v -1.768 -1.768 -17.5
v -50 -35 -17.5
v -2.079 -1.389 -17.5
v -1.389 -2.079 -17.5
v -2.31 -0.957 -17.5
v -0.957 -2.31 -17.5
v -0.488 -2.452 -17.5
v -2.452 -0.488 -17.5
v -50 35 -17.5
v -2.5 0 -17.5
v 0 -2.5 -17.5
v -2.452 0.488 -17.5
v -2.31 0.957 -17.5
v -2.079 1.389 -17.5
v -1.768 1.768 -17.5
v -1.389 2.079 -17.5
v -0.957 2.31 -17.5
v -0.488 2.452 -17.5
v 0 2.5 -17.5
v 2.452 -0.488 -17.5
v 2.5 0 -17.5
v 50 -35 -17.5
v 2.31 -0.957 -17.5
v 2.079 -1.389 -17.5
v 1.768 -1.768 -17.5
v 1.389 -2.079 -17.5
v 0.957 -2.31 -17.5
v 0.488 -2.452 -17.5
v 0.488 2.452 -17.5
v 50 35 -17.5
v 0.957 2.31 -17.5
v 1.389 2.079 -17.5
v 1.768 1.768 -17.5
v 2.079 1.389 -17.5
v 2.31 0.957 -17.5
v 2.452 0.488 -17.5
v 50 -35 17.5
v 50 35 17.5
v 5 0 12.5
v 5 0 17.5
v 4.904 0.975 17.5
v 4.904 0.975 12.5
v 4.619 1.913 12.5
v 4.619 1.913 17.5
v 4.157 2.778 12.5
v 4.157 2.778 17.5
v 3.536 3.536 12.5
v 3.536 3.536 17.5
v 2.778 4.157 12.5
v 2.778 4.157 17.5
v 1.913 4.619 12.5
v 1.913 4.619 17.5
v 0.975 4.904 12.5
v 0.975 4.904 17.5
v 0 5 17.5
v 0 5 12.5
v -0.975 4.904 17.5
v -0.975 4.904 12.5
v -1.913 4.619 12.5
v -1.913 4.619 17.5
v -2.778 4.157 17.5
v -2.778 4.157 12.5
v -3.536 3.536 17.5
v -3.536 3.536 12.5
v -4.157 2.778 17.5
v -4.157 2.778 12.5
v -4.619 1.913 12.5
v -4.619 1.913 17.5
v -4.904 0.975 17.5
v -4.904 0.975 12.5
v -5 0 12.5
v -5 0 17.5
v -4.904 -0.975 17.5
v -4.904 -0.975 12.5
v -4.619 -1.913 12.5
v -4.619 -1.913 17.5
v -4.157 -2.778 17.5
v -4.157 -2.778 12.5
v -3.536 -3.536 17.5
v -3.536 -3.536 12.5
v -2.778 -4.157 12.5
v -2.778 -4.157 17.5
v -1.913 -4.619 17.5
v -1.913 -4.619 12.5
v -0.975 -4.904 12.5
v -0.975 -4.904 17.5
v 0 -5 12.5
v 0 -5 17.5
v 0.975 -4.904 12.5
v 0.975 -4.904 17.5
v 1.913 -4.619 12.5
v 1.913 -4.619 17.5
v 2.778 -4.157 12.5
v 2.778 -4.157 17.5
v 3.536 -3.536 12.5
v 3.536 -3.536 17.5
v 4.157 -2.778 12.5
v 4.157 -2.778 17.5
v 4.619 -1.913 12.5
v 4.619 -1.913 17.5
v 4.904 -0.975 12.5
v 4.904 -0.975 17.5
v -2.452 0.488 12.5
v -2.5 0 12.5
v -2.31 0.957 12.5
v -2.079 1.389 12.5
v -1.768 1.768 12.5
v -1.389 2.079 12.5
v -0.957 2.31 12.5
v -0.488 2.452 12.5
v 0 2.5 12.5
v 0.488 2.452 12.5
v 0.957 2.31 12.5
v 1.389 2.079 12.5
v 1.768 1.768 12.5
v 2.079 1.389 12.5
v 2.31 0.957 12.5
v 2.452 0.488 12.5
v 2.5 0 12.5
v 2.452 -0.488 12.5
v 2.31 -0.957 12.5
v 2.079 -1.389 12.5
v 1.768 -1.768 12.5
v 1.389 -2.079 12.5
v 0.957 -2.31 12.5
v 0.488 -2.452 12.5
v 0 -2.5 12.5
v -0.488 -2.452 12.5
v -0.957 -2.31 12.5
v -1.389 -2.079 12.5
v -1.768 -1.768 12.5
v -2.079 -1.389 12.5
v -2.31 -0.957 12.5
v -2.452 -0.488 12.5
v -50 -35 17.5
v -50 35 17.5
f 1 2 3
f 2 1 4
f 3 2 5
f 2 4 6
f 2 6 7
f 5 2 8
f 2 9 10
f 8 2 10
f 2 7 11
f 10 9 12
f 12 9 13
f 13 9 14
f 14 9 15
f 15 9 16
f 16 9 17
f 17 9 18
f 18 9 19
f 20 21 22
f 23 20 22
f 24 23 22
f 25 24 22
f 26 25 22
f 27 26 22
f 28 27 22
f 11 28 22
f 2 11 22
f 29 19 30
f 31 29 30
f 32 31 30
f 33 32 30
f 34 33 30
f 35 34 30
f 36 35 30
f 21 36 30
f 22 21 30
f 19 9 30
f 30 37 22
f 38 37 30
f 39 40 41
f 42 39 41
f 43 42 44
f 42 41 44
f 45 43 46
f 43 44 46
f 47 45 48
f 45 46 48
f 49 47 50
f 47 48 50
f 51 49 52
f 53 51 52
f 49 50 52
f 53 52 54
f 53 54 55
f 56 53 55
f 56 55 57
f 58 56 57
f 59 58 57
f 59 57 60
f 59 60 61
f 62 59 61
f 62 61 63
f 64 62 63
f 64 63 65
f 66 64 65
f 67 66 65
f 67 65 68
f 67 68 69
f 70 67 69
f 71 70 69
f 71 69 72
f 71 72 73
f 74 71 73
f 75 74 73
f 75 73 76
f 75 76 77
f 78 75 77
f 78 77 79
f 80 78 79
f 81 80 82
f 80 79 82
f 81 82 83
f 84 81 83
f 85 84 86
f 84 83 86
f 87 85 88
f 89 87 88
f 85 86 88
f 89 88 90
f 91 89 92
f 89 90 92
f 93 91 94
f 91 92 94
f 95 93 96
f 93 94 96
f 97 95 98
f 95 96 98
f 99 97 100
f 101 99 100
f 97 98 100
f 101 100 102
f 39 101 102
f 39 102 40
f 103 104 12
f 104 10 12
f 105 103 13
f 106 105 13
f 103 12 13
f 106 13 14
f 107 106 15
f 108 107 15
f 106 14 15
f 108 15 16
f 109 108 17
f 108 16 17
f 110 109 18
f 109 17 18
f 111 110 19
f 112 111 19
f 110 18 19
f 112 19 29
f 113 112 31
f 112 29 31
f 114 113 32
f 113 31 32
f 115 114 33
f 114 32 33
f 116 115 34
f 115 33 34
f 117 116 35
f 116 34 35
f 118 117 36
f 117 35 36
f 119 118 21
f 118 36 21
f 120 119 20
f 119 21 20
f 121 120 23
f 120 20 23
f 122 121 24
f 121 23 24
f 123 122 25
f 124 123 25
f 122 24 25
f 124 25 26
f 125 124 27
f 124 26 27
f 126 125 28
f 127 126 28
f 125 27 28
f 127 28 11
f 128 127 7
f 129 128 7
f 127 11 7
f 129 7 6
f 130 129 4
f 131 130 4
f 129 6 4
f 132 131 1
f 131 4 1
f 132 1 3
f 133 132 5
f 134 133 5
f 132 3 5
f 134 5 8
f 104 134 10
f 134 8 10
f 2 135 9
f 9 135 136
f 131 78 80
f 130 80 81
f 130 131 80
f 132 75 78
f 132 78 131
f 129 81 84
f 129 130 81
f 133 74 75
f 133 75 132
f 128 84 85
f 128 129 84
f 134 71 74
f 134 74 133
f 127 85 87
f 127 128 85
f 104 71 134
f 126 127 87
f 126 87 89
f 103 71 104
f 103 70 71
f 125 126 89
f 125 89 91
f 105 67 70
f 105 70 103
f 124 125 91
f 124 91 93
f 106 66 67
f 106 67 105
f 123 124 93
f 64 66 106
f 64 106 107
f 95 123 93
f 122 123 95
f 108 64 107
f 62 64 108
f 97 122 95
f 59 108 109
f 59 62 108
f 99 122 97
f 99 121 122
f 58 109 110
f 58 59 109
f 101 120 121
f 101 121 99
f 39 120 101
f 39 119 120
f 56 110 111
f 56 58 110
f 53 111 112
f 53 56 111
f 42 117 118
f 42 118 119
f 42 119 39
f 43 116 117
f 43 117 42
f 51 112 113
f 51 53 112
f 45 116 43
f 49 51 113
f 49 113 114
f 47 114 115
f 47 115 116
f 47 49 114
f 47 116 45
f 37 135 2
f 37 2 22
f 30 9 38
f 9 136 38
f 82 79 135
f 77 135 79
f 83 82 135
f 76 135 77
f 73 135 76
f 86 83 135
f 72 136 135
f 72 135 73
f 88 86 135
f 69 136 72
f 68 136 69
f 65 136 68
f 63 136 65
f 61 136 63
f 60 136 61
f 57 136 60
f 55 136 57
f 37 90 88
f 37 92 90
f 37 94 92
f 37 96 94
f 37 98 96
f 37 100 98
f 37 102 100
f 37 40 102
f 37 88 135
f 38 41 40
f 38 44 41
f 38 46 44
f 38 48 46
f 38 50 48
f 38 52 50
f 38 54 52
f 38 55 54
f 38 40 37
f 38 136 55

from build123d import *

# Parameters (mm, degrees)
F0_W           = 100
F0_H           = 70
F1_DEPTH       = 17.5
F4_D           = 5
F4_CBORE_D     = 10
F4_CBORE_DEPTH = 5


with BuildPart() as f1:
    # F0 (on Top) → F1 (new body, symmetric)
    with BuildSketch(Plane.XY):
        Rectangle(F0_W, F0_H)
    extrude(amount=F1_DEPTH, both=True)

    # F4 (through all)
    with Locations(Plane.XY.offset(17.5)):
        with Locations((0, 0)):
            CounterBoreHole(F4_D / 2, F4_CBORE_D / 2, F4_CBORE_DEPTH)


solid = f1.part
